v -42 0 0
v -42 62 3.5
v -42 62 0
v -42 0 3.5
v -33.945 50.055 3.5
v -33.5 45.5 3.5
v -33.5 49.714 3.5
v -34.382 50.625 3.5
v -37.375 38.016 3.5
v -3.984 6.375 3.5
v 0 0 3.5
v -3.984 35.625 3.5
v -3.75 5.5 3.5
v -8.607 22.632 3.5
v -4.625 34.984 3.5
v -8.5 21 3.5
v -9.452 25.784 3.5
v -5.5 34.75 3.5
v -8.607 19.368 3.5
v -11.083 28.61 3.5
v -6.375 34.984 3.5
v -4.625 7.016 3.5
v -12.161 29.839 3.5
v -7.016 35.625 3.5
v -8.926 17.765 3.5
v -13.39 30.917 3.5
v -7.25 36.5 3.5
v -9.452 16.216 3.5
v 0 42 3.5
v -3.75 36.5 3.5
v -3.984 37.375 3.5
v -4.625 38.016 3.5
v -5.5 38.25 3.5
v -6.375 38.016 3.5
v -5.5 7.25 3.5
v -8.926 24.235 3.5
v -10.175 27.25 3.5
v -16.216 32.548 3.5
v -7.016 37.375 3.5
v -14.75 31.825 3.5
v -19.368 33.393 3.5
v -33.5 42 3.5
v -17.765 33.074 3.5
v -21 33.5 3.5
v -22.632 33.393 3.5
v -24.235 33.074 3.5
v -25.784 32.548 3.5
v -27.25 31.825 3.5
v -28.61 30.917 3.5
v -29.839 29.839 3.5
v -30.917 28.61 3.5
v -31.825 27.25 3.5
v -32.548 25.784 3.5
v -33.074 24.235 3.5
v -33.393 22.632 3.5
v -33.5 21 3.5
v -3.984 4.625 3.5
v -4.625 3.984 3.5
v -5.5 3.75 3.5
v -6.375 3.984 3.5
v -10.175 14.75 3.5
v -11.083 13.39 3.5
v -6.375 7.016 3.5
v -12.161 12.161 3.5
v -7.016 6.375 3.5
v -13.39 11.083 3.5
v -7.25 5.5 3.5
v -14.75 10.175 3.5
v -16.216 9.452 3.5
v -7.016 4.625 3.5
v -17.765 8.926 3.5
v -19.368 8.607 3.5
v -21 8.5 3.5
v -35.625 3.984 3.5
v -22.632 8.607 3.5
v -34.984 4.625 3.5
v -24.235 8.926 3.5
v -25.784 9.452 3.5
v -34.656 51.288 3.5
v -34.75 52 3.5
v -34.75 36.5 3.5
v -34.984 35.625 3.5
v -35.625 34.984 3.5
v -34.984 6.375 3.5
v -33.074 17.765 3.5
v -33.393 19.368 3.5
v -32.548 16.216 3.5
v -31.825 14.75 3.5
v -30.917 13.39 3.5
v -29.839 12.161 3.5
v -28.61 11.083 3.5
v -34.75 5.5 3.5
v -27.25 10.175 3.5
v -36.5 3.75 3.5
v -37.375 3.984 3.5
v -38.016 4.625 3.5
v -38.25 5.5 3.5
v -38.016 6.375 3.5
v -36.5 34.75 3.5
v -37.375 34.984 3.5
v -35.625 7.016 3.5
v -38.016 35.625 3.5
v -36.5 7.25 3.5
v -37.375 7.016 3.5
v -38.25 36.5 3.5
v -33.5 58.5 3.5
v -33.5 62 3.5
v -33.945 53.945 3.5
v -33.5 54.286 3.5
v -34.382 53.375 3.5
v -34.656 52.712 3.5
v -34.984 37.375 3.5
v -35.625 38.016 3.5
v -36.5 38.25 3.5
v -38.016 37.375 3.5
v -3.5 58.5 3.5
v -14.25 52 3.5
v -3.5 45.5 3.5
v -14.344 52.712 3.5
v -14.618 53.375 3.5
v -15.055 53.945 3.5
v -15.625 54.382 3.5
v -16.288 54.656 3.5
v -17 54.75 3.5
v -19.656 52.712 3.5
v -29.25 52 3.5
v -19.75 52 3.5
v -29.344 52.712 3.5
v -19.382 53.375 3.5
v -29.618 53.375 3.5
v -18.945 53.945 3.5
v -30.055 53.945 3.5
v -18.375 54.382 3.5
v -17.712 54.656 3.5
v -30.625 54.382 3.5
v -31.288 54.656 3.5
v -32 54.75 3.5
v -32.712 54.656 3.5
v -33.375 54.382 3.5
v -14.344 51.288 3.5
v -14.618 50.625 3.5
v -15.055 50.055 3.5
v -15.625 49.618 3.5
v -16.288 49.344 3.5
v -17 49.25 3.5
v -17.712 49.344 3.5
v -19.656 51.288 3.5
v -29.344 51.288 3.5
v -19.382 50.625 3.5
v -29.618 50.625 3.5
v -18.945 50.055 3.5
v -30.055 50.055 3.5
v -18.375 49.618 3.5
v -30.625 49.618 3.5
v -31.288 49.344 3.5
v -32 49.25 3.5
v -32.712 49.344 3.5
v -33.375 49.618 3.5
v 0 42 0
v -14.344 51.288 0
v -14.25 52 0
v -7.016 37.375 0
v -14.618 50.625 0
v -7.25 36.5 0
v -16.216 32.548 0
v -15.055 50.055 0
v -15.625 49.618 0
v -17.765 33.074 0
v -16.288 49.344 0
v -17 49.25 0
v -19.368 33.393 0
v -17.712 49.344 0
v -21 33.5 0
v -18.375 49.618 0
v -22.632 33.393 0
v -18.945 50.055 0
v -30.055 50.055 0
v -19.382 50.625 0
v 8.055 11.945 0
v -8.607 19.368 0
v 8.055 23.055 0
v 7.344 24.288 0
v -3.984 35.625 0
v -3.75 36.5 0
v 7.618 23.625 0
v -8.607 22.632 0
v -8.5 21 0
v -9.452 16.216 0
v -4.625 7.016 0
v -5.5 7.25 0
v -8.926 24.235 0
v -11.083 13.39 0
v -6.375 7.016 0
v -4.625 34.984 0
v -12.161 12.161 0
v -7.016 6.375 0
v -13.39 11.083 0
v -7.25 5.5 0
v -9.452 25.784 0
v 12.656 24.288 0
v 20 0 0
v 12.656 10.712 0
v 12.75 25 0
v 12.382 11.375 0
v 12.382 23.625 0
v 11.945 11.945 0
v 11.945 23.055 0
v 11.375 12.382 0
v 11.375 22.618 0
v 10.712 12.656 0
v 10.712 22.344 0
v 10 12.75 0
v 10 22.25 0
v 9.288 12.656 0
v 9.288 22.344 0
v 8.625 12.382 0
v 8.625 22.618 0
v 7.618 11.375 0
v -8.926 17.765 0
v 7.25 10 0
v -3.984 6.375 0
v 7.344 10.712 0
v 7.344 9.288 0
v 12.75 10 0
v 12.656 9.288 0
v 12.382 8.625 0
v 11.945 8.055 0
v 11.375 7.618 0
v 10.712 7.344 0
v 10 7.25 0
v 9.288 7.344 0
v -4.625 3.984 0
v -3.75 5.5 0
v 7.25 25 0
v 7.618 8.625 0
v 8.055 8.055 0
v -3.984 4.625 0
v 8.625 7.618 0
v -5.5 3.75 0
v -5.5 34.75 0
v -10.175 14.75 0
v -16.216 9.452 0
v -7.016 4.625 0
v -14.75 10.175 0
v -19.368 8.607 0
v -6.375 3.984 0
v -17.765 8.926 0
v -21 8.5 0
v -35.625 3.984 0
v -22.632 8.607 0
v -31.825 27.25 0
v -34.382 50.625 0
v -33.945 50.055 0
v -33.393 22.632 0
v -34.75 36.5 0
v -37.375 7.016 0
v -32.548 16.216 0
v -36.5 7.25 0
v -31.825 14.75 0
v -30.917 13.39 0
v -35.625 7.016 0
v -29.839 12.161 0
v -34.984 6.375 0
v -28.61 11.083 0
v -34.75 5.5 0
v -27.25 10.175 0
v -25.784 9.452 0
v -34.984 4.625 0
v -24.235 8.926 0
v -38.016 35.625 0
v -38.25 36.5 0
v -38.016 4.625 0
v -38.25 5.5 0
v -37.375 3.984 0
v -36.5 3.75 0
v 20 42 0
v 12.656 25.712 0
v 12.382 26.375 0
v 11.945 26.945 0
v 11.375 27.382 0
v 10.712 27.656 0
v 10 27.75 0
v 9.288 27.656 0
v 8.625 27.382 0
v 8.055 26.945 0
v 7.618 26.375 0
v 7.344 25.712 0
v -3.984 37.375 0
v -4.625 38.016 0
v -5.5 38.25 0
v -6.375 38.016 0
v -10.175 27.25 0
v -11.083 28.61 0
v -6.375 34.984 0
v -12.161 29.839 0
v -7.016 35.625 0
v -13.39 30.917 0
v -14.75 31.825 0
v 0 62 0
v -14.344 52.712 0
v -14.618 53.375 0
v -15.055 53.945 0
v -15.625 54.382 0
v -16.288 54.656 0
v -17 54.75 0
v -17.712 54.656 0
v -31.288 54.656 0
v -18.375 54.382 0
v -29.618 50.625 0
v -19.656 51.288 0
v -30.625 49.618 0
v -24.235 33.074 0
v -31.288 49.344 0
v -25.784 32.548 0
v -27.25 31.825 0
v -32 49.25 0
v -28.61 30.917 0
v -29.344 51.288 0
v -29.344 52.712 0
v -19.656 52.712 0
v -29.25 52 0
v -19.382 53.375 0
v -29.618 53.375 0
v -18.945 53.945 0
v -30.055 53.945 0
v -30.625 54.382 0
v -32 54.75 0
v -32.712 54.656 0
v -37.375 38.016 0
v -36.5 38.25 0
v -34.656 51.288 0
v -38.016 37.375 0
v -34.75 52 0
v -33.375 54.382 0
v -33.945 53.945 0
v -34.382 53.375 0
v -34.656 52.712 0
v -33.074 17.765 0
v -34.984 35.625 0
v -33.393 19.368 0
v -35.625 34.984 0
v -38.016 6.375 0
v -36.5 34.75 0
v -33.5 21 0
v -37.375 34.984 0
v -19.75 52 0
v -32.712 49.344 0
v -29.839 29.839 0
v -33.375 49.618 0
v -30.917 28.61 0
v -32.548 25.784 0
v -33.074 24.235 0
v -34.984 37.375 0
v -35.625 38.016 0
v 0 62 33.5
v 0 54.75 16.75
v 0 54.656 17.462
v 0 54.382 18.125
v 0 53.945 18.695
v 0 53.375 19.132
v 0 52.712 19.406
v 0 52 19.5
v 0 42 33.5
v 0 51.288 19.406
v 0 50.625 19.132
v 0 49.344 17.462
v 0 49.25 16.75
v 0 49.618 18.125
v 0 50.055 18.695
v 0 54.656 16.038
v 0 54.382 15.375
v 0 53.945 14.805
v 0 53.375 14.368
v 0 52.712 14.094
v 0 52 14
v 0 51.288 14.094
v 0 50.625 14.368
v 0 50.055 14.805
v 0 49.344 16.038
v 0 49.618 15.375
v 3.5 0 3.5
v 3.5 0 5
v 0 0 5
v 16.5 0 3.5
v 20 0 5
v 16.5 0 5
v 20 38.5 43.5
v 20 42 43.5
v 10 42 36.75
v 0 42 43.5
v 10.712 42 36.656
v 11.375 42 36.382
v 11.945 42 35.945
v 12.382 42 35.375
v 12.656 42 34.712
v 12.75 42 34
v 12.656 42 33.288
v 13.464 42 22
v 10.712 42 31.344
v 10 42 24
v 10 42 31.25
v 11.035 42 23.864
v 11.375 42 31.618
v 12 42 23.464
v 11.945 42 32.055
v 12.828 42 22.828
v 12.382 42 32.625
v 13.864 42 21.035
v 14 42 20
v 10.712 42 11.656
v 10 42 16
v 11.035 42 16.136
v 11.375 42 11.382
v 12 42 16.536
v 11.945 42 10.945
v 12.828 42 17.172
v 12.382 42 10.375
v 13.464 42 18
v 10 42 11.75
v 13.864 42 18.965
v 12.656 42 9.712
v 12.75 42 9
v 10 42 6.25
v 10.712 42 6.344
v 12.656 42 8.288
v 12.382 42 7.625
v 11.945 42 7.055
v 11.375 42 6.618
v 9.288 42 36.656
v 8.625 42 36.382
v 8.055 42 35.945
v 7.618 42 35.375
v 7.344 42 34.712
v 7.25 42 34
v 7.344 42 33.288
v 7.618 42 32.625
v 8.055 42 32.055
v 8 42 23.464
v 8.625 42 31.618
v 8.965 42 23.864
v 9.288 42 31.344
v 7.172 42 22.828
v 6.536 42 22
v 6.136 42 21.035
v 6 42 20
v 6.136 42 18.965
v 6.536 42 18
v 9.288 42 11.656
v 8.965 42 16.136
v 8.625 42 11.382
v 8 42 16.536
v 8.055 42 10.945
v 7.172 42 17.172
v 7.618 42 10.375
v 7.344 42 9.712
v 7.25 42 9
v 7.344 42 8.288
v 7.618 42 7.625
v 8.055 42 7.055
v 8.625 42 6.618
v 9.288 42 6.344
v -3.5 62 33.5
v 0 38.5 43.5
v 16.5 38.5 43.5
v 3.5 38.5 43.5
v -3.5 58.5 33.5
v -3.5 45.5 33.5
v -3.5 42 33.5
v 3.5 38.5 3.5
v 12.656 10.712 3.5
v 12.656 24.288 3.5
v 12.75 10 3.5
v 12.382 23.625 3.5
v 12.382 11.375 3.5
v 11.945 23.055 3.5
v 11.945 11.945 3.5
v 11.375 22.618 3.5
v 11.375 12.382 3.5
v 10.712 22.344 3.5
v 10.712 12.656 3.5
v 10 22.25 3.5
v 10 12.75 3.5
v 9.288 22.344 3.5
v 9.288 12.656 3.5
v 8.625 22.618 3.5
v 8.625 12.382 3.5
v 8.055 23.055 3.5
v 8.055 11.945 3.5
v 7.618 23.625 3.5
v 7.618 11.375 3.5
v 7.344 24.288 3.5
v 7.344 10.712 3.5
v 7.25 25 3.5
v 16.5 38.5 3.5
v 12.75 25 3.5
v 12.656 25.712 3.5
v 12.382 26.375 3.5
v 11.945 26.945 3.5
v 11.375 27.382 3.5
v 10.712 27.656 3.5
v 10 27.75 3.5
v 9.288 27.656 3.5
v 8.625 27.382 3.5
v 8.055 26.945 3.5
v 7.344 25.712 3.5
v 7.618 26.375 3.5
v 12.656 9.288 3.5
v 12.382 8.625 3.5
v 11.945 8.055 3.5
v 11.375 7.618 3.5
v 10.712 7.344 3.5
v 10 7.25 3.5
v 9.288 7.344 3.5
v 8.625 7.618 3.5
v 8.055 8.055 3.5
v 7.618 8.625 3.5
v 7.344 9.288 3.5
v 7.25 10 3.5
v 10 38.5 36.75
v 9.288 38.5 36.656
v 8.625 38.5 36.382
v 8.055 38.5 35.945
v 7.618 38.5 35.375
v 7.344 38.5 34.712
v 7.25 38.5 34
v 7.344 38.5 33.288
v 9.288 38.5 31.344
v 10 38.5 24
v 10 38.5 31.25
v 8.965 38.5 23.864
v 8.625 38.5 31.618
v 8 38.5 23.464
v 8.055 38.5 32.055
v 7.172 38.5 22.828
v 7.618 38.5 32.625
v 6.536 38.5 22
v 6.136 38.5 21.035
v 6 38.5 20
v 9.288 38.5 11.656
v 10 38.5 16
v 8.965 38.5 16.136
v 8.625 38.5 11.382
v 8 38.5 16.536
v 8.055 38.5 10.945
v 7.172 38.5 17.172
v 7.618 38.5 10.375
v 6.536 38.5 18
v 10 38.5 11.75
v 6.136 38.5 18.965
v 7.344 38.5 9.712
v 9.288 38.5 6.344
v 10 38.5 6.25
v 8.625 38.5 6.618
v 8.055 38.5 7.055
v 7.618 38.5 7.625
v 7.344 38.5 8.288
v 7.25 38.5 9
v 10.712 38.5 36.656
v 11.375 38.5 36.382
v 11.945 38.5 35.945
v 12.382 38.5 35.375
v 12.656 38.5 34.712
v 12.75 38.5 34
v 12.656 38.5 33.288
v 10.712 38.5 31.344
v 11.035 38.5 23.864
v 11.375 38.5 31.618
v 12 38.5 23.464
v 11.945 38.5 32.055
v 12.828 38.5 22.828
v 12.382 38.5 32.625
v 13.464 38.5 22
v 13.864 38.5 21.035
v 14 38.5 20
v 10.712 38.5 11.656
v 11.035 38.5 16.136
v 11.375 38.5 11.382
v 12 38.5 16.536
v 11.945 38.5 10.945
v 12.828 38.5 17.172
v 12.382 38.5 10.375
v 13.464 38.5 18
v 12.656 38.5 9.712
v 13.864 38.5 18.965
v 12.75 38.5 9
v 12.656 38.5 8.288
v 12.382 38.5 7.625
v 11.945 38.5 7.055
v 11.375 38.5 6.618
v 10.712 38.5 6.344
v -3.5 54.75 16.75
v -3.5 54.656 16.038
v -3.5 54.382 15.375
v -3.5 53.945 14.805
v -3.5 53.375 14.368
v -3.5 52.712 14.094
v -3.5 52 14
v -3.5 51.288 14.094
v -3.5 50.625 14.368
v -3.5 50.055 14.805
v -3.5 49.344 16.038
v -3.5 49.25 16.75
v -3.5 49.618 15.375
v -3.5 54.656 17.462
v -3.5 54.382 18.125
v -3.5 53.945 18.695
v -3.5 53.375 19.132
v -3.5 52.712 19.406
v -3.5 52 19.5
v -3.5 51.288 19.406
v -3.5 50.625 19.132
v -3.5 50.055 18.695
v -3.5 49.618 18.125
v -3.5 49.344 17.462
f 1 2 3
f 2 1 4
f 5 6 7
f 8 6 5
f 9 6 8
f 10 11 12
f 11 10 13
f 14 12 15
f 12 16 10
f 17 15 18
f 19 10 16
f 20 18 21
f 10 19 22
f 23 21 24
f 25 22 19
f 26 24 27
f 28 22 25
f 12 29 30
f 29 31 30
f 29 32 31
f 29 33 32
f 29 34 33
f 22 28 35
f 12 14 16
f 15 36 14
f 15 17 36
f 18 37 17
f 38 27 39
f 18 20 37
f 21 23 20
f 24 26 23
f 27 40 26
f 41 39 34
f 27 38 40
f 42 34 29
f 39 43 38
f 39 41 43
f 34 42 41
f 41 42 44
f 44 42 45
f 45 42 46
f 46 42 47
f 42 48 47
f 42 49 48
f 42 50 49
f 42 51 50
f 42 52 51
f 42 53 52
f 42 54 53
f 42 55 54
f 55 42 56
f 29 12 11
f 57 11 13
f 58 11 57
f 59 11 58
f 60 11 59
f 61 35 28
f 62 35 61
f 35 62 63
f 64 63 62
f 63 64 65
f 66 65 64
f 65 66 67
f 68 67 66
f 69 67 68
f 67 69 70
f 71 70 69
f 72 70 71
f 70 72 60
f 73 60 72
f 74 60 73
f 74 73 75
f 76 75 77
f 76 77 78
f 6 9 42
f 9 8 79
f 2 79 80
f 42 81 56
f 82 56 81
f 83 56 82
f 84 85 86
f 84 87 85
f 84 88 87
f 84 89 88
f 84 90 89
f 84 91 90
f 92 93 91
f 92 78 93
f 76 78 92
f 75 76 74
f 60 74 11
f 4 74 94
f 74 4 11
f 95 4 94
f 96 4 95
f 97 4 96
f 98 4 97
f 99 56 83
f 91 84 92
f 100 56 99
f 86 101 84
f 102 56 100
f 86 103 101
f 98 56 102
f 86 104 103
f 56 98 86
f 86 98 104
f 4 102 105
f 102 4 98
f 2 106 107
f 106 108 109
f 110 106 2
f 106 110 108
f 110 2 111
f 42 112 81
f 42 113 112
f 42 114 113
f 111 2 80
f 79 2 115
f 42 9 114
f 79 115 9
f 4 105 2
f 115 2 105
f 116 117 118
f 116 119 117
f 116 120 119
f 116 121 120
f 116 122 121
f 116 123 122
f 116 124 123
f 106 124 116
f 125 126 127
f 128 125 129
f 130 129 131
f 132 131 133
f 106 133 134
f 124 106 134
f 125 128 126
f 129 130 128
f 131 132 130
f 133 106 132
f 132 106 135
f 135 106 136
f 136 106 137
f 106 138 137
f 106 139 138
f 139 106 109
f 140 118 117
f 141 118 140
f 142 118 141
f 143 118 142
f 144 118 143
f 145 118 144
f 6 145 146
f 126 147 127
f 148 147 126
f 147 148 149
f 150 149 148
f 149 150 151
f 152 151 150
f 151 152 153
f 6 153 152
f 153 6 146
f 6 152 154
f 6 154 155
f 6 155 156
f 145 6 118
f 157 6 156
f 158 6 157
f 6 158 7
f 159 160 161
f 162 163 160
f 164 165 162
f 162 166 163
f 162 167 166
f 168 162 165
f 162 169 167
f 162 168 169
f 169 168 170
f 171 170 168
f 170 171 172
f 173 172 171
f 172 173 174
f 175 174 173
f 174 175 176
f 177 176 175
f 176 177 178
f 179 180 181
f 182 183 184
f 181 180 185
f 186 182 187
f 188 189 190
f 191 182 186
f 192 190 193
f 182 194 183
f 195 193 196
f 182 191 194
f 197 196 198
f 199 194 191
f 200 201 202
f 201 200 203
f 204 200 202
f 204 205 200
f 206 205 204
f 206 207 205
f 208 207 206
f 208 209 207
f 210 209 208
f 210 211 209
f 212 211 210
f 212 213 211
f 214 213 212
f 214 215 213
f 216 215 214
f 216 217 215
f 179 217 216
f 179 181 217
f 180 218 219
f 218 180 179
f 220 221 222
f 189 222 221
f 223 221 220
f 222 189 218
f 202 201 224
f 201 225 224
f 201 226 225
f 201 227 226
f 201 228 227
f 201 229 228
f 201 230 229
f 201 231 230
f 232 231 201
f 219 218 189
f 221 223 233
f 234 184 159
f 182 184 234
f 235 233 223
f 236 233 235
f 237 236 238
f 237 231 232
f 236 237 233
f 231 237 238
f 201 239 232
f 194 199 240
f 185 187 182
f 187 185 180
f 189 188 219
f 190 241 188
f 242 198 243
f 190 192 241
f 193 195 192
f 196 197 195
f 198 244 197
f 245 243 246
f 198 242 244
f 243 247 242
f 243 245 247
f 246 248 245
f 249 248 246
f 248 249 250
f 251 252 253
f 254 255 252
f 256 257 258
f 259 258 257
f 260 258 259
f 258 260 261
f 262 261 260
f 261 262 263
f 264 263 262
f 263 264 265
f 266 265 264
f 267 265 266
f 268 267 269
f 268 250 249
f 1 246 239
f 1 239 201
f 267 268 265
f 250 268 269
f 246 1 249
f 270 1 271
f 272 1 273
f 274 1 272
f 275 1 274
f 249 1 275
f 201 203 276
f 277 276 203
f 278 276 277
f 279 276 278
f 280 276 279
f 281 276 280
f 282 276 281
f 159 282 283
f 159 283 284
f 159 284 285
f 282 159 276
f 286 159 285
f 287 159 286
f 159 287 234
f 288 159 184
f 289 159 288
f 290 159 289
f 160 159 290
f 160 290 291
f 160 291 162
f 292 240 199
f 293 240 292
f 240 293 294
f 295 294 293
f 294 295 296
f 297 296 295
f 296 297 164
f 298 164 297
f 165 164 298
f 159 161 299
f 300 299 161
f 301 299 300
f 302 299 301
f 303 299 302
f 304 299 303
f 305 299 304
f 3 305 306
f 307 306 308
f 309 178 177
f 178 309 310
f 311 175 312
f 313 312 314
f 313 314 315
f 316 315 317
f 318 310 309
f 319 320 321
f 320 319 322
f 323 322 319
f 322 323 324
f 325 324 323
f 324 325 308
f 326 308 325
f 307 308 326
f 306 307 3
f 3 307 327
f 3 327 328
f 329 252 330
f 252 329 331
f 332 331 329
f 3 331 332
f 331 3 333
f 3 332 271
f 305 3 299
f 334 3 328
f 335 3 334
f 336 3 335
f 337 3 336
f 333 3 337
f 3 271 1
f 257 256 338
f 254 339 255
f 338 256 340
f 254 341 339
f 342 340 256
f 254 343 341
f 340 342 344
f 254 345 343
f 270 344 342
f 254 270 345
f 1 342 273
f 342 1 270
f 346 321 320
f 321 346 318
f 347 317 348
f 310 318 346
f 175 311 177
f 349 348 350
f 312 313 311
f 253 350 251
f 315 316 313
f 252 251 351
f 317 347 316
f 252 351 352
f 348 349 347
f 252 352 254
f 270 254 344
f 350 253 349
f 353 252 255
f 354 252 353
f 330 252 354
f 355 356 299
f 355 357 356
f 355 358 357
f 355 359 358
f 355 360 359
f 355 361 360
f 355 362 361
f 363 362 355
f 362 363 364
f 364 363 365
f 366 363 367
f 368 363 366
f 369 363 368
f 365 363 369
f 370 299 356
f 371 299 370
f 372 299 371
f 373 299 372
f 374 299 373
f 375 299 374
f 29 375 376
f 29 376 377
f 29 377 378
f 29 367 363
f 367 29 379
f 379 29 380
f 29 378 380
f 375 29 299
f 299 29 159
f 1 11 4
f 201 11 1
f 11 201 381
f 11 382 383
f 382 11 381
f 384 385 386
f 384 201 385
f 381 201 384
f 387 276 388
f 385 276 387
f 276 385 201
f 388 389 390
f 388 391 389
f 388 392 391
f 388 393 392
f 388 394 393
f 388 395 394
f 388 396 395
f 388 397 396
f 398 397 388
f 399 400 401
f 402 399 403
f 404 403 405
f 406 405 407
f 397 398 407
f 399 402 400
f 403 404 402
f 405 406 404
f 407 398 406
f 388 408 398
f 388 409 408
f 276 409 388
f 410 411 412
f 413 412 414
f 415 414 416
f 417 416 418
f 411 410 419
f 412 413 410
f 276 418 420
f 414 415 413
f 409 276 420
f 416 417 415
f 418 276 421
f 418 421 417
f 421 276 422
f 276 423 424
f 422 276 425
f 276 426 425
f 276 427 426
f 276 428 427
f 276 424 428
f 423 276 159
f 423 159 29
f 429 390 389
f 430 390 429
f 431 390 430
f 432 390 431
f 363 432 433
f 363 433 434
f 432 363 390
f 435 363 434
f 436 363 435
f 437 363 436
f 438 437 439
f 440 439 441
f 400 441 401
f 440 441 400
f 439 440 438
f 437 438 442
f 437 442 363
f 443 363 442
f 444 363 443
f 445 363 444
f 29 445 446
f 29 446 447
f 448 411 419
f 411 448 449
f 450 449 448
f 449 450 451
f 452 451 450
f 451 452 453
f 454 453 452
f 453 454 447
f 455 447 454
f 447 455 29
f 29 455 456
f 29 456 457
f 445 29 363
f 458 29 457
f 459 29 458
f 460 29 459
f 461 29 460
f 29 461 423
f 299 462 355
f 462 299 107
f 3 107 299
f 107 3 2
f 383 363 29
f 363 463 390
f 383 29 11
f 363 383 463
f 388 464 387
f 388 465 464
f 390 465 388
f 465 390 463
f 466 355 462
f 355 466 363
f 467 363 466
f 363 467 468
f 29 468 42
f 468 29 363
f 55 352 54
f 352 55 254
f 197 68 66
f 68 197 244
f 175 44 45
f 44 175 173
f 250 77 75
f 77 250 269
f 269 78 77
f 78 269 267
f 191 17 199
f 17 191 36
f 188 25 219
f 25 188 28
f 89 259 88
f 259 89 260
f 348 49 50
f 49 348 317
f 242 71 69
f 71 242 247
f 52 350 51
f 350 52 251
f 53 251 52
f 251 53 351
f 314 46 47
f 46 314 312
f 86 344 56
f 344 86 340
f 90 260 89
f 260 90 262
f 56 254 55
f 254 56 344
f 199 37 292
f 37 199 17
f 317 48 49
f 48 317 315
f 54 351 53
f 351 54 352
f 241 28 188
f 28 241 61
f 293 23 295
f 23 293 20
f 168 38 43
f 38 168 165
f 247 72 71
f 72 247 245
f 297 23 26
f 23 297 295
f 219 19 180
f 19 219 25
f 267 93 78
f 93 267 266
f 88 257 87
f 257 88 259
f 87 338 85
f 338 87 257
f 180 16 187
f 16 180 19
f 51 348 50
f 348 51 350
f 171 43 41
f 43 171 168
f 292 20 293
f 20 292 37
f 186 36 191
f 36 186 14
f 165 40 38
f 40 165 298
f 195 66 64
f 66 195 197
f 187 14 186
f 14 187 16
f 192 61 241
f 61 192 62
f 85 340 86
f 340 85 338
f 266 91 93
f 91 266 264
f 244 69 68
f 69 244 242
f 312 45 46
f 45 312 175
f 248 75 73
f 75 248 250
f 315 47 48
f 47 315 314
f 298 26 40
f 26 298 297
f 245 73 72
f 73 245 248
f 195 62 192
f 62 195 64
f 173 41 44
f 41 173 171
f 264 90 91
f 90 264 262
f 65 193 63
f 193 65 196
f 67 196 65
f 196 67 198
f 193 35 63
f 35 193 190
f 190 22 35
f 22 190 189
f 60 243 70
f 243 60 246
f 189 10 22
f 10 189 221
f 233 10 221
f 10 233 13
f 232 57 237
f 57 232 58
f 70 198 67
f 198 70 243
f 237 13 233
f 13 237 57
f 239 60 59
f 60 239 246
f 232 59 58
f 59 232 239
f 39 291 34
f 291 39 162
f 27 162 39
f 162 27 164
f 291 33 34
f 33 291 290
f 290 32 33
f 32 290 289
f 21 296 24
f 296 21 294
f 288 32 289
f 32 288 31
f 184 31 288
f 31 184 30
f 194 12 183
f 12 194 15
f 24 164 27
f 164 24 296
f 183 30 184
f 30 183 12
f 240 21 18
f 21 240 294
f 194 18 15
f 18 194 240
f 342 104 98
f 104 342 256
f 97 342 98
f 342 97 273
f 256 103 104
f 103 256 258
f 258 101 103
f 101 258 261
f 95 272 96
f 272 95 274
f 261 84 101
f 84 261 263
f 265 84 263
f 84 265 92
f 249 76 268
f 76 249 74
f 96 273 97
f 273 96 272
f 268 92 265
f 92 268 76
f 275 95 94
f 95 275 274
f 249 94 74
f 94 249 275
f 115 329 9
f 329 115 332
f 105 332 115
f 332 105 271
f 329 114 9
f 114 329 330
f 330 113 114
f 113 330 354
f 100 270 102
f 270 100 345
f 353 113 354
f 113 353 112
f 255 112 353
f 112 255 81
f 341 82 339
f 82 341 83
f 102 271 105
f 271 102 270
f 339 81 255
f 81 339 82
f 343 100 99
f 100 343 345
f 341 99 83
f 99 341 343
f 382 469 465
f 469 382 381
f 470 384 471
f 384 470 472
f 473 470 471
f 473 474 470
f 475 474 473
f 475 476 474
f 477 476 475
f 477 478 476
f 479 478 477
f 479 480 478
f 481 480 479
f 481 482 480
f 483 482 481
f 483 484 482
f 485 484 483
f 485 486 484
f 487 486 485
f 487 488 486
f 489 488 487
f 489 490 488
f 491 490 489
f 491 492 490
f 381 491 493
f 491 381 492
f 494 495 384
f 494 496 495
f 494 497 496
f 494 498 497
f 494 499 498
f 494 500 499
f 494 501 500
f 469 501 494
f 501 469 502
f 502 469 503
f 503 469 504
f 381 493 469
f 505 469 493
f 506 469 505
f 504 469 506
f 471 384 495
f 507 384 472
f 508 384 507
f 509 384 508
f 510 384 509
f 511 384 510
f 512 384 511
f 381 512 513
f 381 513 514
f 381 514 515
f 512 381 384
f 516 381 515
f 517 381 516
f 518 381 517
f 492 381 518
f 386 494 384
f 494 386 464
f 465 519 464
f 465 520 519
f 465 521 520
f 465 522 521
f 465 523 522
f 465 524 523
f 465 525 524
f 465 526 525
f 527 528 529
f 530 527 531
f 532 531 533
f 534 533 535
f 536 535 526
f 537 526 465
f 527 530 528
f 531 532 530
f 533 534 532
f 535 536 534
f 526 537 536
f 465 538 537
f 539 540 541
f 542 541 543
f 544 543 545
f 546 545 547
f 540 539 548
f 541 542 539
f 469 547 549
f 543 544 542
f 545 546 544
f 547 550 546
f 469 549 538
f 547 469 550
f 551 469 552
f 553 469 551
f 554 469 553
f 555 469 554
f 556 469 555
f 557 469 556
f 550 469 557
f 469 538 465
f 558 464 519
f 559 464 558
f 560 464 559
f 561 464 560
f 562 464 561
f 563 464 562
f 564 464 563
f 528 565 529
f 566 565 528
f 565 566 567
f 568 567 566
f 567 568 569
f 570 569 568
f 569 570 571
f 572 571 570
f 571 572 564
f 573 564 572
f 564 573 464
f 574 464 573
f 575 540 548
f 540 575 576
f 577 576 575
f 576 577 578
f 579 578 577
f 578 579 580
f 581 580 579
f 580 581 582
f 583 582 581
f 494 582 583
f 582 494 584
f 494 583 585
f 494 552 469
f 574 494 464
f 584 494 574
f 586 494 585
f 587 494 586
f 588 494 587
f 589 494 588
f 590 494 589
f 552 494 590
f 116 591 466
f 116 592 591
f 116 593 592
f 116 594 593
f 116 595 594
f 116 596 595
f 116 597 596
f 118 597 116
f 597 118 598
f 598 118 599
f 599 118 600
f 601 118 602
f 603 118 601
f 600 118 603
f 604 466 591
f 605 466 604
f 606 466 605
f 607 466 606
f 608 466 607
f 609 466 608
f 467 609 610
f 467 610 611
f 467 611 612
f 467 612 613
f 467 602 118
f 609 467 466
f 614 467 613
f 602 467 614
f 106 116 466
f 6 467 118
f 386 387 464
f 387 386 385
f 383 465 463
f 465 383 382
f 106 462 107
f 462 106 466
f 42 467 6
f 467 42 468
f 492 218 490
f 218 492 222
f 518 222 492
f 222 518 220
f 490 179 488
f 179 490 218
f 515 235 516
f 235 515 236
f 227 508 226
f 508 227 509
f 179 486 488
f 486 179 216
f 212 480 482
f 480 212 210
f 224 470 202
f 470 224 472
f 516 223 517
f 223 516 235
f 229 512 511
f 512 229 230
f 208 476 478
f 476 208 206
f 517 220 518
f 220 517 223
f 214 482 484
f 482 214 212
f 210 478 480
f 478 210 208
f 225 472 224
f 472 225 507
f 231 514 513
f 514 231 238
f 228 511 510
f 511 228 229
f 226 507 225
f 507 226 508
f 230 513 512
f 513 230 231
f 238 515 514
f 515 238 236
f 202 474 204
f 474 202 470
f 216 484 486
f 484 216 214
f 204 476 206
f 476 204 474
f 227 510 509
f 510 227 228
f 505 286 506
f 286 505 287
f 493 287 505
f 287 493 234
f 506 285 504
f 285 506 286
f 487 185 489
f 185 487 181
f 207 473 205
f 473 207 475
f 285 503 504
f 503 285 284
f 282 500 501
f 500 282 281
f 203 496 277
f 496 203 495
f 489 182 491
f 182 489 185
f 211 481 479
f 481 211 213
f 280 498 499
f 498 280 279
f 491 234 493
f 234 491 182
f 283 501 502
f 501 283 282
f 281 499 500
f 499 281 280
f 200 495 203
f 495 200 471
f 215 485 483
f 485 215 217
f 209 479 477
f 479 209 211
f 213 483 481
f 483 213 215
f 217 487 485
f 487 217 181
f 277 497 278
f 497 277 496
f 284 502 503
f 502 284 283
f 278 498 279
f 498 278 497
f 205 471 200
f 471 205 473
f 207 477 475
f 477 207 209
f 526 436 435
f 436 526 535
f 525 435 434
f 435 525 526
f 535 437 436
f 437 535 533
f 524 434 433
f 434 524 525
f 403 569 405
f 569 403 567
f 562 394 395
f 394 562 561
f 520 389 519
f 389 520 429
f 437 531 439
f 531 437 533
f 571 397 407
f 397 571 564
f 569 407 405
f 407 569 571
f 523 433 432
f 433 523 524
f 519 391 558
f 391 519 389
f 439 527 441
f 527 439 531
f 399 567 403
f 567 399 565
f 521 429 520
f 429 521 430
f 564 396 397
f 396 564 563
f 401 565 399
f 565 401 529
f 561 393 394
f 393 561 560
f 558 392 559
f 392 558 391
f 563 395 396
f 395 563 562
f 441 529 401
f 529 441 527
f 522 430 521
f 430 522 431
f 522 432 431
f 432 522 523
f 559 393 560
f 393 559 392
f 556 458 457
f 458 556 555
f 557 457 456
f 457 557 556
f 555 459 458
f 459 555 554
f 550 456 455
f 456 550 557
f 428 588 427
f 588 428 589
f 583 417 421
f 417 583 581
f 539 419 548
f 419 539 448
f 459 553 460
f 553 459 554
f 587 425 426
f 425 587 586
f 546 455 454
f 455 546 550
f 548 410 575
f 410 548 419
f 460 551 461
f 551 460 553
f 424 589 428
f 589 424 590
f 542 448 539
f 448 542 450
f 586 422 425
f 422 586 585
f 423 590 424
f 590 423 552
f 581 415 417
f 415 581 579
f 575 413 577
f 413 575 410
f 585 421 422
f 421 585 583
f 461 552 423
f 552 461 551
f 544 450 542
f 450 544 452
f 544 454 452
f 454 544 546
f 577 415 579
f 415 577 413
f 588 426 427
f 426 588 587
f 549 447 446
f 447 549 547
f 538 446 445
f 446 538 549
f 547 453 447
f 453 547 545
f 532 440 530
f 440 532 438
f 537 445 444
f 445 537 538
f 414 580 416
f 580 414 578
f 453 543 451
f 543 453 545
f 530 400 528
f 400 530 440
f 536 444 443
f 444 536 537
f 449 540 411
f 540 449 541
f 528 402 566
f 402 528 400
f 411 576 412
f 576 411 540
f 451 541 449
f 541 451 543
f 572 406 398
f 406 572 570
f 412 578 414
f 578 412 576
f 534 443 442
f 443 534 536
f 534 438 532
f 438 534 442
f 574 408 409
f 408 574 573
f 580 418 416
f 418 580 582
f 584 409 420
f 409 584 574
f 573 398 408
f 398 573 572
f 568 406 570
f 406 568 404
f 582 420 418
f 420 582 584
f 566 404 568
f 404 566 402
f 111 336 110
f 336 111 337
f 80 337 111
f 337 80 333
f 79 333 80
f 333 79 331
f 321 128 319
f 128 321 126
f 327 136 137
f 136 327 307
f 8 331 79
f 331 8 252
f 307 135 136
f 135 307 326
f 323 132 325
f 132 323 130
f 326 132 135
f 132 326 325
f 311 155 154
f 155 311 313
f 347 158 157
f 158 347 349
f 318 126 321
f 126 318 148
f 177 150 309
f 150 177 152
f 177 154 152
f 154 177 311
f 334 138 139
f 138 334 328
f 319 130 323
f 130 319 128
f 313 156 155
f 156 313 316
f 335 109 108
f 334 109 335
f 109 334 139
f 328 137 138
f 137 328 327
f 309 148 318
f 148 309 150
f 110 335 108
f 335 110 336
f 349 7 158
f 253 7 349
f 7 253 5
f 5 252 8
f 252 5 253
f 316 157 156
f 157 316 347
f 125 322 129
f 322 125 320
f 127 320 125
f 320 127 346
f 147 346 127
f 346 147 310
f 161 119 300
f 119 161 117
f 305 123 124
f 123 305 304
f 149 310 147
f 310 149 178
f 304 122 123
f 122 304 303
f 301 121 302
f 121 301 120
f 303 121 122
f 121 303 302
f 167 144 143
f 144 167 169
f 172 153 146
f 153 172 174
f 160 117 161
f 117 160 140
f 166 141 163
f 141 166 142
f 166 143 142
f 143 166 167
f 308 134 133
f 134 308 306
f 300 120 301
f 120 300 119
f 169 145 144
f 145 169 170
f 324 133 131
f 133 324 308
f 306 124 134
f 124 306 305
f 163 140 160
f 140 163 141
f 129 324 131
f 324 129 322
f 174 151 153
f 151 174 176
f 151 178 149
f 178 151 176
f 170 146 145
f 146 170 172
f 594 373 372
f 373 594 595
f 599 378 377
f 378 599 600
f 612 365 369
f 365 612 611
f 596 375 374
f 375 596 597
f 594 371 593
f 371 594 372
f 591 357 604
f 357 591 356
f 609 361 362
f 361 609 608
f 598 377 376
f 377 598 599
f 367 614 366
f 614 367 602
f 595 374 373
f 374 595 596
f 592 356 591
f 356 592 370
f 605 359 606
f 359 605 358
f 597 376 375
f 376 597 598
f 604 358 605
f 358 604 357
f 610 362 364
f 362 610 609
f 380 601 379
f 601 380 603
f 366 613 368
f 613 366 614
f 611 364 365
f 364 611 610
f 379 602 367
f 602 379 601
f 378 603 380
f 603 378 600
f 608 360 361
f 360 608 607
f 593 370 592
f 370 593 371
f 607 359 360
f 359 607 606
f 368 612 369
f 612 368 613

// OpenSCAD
t=3.5;
mirror([1,0,0])
difference()
{
    union()
    {
        cube([42,42,t]);
        
        translate([-20,0,0])
            cube([20,42,t]);
        translate([0,42,0])
            cube([42,20,t]);
        
        translate([-20,0,t])
            cube([20,42,40]);
        translate([0,42,t])
            cube([33.5,20,30]);
    }
    
    union()
    {
        translate([21,21,0])
            cylinder(d=25,h=t,$fn=48);
        
        translate([21-31/2,21-31/2,0])
            cylinder(d=3.5,h=t,$fn=12);
        translate([21-31/2,21+31/2,0])
            cylinder(d=3.5,h=t,$fn=12);
        translate([21+31/2,21-31/2,0])
            cylinder(d=3.5,h=t,$fn=12);
        translate([21+31/2,21+31/2,0])
            cylinder(d=3.5,h=t,$fn=12);
        
        translate([-20+t,0,t])
            cube([20-t*2,42-t,40]);
        translate([0+t,42+t,t])
            cube([33.5-t,20-t*2,30]);
        
        translate([-20,0,t+t-2])
            rotate([45,0,0])
                cube([20,42*sqrt(2),42*sqrt(2)]);
        translate([30+3.5,42,t+t-3.5])
            rotate([0,45+270,0])
                cube([33*sqrt(2),20,33*sqrt(2)]);
        
        translate([-10,10,0])
            cylinder(d=5.5,h=t,$fn=24);
        translate([-10,25,0])
            cylinder(d=5.5,h=t,$fn=24);
            
        translate([-10,42-t,20+14])
            rotate([270,0,0])
                cylinder(d=5.5,h=t,$fn=24);
        translate([-10,42-t,20-11])
            rotate([270,0,0])
                cylinder(d=5.5,h=t,$fn=24);
                
        translate([-10,42-t,20])
            rotate([270,0,0])
                cylinder(d=8,h=t,$fn=24);
        
        translate([42-10,42+10,0])
            cylinder(d=5.5,h=t,$fn=24);
        translate([42-25,42+10,0])
            cylinder(d=5.5,h=t,$fn=24);
            
        translate([0,42+10,t+(30-t)/2])
            rotate([0,90,0])
                cylinder(d=5.5,h=t+1,$fn=24);
    }
}
